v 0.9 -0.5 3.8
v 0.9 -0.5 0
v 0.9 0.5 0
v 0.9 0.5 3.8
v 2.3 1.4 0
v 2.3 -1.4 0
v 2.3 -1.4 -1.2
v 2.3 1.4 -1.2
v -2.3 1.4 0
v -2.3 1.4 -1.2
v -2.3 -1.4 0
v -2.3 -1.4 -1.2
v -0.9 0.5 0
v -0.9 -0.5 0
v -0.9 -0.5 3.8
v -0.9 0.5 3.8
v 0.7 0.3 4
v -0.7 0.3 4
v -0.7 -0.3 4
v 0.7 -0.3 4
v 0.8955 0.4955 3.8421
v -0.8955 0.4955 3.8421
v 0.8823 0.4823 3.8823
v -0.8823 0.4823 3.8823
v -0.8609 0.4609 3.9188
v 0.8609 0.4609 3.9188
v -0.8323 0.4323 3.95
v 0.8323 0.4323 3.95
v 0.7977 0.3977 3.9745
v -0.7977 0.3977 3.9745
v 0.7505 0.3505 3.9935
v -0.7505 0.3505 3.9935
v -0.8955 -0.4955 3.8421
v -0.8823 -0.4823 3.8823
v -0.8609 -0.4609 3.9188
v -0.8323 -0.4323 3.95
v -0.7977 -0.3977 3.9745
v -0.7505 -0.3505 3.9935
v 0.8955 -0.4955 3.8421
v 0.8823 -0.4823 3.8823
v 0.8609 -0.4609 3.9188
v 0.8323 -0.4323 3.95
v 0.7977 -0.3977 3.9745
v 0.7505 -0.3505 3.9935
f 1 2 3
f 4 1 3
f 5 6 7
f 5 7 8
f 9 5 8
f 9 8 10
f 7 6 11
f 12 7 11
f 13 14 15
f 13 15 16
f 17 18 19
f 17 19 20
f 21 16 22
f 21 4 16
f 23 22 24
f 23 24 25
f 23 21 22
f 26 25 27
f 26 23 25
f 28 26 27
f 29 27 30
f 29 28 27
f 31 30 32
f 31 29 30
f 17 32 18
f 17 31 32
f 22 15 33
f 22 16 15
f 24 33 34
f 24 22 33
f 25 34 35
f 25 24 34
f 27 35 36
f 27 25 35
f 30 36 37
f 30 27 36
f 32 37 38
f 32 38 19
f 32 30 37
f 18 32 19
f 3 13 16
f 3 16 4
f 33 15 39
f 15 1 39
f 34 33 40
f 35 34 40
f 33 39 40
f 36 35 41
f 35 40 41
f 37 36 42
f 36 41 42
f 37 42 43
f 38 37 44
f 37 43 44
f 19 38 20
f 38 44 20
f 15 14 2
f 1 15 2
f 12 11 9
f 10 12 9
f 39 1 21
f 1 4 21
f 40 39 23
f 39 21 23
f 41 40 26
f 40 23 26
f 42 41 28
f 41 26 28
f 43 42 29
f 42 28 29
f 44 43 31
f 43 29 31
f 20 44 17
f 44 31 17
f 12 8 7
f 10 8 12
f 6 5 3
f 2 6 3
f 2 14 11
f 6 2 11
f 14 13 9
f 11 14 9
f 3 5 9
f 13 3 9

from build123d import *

# Parameters (mm, degrees)
SKIZZE1_W                       = 1.8
SKIZZE1_H                       = 1
AUFSATZ_LINEAR_AUSTRAGEN1_DEPTH = 4
SKIZZE2_W                       = 4.6
SKIZZE2_H                       = 2.8
AUFSATZ_LINEAR_AUSTRAGEN2_DEPTH = 1.2
VERRUNDUNG1_R                   = 0.2


with BuildPart() as part:
    # Skizze1 → Aufsatz-Linear austragen1 (new body)
    with BuildSketch(Plane.XY):
        Rectangle(SKIZZE1_W, SKIZZE1_H)
    extrude(amount=AUFSATZ_LINEAR_AUSTRAGEN1_DEPTH)

    # Skizze2 → Aufsatz-Linear austragen2 (add)
    with BuildSketch(Plane(origin=(0, 0, 0), x_dir=(-1, 0, 0), z_dir=(0, 0, -1))):
        Rectangle(SKIZZE2_W, SKIZZE2_H)
    extrude(amount=AUFSATZ_LINEAR_AUSTRAGEN2_DEPTH)

    # Verrundung1
    verrundung1_edges = [part.edges().sort_by_distance(p)[0] for p in [
        (-0.9, 0, 4),
        (0, -0.5, 4),
        (0.9, 0, 4),
        (0, 0.5, 4),
    ]]
    fillet(verrundung1_edges, radius=VERRUNDUNG1_R)


solid = part.part
